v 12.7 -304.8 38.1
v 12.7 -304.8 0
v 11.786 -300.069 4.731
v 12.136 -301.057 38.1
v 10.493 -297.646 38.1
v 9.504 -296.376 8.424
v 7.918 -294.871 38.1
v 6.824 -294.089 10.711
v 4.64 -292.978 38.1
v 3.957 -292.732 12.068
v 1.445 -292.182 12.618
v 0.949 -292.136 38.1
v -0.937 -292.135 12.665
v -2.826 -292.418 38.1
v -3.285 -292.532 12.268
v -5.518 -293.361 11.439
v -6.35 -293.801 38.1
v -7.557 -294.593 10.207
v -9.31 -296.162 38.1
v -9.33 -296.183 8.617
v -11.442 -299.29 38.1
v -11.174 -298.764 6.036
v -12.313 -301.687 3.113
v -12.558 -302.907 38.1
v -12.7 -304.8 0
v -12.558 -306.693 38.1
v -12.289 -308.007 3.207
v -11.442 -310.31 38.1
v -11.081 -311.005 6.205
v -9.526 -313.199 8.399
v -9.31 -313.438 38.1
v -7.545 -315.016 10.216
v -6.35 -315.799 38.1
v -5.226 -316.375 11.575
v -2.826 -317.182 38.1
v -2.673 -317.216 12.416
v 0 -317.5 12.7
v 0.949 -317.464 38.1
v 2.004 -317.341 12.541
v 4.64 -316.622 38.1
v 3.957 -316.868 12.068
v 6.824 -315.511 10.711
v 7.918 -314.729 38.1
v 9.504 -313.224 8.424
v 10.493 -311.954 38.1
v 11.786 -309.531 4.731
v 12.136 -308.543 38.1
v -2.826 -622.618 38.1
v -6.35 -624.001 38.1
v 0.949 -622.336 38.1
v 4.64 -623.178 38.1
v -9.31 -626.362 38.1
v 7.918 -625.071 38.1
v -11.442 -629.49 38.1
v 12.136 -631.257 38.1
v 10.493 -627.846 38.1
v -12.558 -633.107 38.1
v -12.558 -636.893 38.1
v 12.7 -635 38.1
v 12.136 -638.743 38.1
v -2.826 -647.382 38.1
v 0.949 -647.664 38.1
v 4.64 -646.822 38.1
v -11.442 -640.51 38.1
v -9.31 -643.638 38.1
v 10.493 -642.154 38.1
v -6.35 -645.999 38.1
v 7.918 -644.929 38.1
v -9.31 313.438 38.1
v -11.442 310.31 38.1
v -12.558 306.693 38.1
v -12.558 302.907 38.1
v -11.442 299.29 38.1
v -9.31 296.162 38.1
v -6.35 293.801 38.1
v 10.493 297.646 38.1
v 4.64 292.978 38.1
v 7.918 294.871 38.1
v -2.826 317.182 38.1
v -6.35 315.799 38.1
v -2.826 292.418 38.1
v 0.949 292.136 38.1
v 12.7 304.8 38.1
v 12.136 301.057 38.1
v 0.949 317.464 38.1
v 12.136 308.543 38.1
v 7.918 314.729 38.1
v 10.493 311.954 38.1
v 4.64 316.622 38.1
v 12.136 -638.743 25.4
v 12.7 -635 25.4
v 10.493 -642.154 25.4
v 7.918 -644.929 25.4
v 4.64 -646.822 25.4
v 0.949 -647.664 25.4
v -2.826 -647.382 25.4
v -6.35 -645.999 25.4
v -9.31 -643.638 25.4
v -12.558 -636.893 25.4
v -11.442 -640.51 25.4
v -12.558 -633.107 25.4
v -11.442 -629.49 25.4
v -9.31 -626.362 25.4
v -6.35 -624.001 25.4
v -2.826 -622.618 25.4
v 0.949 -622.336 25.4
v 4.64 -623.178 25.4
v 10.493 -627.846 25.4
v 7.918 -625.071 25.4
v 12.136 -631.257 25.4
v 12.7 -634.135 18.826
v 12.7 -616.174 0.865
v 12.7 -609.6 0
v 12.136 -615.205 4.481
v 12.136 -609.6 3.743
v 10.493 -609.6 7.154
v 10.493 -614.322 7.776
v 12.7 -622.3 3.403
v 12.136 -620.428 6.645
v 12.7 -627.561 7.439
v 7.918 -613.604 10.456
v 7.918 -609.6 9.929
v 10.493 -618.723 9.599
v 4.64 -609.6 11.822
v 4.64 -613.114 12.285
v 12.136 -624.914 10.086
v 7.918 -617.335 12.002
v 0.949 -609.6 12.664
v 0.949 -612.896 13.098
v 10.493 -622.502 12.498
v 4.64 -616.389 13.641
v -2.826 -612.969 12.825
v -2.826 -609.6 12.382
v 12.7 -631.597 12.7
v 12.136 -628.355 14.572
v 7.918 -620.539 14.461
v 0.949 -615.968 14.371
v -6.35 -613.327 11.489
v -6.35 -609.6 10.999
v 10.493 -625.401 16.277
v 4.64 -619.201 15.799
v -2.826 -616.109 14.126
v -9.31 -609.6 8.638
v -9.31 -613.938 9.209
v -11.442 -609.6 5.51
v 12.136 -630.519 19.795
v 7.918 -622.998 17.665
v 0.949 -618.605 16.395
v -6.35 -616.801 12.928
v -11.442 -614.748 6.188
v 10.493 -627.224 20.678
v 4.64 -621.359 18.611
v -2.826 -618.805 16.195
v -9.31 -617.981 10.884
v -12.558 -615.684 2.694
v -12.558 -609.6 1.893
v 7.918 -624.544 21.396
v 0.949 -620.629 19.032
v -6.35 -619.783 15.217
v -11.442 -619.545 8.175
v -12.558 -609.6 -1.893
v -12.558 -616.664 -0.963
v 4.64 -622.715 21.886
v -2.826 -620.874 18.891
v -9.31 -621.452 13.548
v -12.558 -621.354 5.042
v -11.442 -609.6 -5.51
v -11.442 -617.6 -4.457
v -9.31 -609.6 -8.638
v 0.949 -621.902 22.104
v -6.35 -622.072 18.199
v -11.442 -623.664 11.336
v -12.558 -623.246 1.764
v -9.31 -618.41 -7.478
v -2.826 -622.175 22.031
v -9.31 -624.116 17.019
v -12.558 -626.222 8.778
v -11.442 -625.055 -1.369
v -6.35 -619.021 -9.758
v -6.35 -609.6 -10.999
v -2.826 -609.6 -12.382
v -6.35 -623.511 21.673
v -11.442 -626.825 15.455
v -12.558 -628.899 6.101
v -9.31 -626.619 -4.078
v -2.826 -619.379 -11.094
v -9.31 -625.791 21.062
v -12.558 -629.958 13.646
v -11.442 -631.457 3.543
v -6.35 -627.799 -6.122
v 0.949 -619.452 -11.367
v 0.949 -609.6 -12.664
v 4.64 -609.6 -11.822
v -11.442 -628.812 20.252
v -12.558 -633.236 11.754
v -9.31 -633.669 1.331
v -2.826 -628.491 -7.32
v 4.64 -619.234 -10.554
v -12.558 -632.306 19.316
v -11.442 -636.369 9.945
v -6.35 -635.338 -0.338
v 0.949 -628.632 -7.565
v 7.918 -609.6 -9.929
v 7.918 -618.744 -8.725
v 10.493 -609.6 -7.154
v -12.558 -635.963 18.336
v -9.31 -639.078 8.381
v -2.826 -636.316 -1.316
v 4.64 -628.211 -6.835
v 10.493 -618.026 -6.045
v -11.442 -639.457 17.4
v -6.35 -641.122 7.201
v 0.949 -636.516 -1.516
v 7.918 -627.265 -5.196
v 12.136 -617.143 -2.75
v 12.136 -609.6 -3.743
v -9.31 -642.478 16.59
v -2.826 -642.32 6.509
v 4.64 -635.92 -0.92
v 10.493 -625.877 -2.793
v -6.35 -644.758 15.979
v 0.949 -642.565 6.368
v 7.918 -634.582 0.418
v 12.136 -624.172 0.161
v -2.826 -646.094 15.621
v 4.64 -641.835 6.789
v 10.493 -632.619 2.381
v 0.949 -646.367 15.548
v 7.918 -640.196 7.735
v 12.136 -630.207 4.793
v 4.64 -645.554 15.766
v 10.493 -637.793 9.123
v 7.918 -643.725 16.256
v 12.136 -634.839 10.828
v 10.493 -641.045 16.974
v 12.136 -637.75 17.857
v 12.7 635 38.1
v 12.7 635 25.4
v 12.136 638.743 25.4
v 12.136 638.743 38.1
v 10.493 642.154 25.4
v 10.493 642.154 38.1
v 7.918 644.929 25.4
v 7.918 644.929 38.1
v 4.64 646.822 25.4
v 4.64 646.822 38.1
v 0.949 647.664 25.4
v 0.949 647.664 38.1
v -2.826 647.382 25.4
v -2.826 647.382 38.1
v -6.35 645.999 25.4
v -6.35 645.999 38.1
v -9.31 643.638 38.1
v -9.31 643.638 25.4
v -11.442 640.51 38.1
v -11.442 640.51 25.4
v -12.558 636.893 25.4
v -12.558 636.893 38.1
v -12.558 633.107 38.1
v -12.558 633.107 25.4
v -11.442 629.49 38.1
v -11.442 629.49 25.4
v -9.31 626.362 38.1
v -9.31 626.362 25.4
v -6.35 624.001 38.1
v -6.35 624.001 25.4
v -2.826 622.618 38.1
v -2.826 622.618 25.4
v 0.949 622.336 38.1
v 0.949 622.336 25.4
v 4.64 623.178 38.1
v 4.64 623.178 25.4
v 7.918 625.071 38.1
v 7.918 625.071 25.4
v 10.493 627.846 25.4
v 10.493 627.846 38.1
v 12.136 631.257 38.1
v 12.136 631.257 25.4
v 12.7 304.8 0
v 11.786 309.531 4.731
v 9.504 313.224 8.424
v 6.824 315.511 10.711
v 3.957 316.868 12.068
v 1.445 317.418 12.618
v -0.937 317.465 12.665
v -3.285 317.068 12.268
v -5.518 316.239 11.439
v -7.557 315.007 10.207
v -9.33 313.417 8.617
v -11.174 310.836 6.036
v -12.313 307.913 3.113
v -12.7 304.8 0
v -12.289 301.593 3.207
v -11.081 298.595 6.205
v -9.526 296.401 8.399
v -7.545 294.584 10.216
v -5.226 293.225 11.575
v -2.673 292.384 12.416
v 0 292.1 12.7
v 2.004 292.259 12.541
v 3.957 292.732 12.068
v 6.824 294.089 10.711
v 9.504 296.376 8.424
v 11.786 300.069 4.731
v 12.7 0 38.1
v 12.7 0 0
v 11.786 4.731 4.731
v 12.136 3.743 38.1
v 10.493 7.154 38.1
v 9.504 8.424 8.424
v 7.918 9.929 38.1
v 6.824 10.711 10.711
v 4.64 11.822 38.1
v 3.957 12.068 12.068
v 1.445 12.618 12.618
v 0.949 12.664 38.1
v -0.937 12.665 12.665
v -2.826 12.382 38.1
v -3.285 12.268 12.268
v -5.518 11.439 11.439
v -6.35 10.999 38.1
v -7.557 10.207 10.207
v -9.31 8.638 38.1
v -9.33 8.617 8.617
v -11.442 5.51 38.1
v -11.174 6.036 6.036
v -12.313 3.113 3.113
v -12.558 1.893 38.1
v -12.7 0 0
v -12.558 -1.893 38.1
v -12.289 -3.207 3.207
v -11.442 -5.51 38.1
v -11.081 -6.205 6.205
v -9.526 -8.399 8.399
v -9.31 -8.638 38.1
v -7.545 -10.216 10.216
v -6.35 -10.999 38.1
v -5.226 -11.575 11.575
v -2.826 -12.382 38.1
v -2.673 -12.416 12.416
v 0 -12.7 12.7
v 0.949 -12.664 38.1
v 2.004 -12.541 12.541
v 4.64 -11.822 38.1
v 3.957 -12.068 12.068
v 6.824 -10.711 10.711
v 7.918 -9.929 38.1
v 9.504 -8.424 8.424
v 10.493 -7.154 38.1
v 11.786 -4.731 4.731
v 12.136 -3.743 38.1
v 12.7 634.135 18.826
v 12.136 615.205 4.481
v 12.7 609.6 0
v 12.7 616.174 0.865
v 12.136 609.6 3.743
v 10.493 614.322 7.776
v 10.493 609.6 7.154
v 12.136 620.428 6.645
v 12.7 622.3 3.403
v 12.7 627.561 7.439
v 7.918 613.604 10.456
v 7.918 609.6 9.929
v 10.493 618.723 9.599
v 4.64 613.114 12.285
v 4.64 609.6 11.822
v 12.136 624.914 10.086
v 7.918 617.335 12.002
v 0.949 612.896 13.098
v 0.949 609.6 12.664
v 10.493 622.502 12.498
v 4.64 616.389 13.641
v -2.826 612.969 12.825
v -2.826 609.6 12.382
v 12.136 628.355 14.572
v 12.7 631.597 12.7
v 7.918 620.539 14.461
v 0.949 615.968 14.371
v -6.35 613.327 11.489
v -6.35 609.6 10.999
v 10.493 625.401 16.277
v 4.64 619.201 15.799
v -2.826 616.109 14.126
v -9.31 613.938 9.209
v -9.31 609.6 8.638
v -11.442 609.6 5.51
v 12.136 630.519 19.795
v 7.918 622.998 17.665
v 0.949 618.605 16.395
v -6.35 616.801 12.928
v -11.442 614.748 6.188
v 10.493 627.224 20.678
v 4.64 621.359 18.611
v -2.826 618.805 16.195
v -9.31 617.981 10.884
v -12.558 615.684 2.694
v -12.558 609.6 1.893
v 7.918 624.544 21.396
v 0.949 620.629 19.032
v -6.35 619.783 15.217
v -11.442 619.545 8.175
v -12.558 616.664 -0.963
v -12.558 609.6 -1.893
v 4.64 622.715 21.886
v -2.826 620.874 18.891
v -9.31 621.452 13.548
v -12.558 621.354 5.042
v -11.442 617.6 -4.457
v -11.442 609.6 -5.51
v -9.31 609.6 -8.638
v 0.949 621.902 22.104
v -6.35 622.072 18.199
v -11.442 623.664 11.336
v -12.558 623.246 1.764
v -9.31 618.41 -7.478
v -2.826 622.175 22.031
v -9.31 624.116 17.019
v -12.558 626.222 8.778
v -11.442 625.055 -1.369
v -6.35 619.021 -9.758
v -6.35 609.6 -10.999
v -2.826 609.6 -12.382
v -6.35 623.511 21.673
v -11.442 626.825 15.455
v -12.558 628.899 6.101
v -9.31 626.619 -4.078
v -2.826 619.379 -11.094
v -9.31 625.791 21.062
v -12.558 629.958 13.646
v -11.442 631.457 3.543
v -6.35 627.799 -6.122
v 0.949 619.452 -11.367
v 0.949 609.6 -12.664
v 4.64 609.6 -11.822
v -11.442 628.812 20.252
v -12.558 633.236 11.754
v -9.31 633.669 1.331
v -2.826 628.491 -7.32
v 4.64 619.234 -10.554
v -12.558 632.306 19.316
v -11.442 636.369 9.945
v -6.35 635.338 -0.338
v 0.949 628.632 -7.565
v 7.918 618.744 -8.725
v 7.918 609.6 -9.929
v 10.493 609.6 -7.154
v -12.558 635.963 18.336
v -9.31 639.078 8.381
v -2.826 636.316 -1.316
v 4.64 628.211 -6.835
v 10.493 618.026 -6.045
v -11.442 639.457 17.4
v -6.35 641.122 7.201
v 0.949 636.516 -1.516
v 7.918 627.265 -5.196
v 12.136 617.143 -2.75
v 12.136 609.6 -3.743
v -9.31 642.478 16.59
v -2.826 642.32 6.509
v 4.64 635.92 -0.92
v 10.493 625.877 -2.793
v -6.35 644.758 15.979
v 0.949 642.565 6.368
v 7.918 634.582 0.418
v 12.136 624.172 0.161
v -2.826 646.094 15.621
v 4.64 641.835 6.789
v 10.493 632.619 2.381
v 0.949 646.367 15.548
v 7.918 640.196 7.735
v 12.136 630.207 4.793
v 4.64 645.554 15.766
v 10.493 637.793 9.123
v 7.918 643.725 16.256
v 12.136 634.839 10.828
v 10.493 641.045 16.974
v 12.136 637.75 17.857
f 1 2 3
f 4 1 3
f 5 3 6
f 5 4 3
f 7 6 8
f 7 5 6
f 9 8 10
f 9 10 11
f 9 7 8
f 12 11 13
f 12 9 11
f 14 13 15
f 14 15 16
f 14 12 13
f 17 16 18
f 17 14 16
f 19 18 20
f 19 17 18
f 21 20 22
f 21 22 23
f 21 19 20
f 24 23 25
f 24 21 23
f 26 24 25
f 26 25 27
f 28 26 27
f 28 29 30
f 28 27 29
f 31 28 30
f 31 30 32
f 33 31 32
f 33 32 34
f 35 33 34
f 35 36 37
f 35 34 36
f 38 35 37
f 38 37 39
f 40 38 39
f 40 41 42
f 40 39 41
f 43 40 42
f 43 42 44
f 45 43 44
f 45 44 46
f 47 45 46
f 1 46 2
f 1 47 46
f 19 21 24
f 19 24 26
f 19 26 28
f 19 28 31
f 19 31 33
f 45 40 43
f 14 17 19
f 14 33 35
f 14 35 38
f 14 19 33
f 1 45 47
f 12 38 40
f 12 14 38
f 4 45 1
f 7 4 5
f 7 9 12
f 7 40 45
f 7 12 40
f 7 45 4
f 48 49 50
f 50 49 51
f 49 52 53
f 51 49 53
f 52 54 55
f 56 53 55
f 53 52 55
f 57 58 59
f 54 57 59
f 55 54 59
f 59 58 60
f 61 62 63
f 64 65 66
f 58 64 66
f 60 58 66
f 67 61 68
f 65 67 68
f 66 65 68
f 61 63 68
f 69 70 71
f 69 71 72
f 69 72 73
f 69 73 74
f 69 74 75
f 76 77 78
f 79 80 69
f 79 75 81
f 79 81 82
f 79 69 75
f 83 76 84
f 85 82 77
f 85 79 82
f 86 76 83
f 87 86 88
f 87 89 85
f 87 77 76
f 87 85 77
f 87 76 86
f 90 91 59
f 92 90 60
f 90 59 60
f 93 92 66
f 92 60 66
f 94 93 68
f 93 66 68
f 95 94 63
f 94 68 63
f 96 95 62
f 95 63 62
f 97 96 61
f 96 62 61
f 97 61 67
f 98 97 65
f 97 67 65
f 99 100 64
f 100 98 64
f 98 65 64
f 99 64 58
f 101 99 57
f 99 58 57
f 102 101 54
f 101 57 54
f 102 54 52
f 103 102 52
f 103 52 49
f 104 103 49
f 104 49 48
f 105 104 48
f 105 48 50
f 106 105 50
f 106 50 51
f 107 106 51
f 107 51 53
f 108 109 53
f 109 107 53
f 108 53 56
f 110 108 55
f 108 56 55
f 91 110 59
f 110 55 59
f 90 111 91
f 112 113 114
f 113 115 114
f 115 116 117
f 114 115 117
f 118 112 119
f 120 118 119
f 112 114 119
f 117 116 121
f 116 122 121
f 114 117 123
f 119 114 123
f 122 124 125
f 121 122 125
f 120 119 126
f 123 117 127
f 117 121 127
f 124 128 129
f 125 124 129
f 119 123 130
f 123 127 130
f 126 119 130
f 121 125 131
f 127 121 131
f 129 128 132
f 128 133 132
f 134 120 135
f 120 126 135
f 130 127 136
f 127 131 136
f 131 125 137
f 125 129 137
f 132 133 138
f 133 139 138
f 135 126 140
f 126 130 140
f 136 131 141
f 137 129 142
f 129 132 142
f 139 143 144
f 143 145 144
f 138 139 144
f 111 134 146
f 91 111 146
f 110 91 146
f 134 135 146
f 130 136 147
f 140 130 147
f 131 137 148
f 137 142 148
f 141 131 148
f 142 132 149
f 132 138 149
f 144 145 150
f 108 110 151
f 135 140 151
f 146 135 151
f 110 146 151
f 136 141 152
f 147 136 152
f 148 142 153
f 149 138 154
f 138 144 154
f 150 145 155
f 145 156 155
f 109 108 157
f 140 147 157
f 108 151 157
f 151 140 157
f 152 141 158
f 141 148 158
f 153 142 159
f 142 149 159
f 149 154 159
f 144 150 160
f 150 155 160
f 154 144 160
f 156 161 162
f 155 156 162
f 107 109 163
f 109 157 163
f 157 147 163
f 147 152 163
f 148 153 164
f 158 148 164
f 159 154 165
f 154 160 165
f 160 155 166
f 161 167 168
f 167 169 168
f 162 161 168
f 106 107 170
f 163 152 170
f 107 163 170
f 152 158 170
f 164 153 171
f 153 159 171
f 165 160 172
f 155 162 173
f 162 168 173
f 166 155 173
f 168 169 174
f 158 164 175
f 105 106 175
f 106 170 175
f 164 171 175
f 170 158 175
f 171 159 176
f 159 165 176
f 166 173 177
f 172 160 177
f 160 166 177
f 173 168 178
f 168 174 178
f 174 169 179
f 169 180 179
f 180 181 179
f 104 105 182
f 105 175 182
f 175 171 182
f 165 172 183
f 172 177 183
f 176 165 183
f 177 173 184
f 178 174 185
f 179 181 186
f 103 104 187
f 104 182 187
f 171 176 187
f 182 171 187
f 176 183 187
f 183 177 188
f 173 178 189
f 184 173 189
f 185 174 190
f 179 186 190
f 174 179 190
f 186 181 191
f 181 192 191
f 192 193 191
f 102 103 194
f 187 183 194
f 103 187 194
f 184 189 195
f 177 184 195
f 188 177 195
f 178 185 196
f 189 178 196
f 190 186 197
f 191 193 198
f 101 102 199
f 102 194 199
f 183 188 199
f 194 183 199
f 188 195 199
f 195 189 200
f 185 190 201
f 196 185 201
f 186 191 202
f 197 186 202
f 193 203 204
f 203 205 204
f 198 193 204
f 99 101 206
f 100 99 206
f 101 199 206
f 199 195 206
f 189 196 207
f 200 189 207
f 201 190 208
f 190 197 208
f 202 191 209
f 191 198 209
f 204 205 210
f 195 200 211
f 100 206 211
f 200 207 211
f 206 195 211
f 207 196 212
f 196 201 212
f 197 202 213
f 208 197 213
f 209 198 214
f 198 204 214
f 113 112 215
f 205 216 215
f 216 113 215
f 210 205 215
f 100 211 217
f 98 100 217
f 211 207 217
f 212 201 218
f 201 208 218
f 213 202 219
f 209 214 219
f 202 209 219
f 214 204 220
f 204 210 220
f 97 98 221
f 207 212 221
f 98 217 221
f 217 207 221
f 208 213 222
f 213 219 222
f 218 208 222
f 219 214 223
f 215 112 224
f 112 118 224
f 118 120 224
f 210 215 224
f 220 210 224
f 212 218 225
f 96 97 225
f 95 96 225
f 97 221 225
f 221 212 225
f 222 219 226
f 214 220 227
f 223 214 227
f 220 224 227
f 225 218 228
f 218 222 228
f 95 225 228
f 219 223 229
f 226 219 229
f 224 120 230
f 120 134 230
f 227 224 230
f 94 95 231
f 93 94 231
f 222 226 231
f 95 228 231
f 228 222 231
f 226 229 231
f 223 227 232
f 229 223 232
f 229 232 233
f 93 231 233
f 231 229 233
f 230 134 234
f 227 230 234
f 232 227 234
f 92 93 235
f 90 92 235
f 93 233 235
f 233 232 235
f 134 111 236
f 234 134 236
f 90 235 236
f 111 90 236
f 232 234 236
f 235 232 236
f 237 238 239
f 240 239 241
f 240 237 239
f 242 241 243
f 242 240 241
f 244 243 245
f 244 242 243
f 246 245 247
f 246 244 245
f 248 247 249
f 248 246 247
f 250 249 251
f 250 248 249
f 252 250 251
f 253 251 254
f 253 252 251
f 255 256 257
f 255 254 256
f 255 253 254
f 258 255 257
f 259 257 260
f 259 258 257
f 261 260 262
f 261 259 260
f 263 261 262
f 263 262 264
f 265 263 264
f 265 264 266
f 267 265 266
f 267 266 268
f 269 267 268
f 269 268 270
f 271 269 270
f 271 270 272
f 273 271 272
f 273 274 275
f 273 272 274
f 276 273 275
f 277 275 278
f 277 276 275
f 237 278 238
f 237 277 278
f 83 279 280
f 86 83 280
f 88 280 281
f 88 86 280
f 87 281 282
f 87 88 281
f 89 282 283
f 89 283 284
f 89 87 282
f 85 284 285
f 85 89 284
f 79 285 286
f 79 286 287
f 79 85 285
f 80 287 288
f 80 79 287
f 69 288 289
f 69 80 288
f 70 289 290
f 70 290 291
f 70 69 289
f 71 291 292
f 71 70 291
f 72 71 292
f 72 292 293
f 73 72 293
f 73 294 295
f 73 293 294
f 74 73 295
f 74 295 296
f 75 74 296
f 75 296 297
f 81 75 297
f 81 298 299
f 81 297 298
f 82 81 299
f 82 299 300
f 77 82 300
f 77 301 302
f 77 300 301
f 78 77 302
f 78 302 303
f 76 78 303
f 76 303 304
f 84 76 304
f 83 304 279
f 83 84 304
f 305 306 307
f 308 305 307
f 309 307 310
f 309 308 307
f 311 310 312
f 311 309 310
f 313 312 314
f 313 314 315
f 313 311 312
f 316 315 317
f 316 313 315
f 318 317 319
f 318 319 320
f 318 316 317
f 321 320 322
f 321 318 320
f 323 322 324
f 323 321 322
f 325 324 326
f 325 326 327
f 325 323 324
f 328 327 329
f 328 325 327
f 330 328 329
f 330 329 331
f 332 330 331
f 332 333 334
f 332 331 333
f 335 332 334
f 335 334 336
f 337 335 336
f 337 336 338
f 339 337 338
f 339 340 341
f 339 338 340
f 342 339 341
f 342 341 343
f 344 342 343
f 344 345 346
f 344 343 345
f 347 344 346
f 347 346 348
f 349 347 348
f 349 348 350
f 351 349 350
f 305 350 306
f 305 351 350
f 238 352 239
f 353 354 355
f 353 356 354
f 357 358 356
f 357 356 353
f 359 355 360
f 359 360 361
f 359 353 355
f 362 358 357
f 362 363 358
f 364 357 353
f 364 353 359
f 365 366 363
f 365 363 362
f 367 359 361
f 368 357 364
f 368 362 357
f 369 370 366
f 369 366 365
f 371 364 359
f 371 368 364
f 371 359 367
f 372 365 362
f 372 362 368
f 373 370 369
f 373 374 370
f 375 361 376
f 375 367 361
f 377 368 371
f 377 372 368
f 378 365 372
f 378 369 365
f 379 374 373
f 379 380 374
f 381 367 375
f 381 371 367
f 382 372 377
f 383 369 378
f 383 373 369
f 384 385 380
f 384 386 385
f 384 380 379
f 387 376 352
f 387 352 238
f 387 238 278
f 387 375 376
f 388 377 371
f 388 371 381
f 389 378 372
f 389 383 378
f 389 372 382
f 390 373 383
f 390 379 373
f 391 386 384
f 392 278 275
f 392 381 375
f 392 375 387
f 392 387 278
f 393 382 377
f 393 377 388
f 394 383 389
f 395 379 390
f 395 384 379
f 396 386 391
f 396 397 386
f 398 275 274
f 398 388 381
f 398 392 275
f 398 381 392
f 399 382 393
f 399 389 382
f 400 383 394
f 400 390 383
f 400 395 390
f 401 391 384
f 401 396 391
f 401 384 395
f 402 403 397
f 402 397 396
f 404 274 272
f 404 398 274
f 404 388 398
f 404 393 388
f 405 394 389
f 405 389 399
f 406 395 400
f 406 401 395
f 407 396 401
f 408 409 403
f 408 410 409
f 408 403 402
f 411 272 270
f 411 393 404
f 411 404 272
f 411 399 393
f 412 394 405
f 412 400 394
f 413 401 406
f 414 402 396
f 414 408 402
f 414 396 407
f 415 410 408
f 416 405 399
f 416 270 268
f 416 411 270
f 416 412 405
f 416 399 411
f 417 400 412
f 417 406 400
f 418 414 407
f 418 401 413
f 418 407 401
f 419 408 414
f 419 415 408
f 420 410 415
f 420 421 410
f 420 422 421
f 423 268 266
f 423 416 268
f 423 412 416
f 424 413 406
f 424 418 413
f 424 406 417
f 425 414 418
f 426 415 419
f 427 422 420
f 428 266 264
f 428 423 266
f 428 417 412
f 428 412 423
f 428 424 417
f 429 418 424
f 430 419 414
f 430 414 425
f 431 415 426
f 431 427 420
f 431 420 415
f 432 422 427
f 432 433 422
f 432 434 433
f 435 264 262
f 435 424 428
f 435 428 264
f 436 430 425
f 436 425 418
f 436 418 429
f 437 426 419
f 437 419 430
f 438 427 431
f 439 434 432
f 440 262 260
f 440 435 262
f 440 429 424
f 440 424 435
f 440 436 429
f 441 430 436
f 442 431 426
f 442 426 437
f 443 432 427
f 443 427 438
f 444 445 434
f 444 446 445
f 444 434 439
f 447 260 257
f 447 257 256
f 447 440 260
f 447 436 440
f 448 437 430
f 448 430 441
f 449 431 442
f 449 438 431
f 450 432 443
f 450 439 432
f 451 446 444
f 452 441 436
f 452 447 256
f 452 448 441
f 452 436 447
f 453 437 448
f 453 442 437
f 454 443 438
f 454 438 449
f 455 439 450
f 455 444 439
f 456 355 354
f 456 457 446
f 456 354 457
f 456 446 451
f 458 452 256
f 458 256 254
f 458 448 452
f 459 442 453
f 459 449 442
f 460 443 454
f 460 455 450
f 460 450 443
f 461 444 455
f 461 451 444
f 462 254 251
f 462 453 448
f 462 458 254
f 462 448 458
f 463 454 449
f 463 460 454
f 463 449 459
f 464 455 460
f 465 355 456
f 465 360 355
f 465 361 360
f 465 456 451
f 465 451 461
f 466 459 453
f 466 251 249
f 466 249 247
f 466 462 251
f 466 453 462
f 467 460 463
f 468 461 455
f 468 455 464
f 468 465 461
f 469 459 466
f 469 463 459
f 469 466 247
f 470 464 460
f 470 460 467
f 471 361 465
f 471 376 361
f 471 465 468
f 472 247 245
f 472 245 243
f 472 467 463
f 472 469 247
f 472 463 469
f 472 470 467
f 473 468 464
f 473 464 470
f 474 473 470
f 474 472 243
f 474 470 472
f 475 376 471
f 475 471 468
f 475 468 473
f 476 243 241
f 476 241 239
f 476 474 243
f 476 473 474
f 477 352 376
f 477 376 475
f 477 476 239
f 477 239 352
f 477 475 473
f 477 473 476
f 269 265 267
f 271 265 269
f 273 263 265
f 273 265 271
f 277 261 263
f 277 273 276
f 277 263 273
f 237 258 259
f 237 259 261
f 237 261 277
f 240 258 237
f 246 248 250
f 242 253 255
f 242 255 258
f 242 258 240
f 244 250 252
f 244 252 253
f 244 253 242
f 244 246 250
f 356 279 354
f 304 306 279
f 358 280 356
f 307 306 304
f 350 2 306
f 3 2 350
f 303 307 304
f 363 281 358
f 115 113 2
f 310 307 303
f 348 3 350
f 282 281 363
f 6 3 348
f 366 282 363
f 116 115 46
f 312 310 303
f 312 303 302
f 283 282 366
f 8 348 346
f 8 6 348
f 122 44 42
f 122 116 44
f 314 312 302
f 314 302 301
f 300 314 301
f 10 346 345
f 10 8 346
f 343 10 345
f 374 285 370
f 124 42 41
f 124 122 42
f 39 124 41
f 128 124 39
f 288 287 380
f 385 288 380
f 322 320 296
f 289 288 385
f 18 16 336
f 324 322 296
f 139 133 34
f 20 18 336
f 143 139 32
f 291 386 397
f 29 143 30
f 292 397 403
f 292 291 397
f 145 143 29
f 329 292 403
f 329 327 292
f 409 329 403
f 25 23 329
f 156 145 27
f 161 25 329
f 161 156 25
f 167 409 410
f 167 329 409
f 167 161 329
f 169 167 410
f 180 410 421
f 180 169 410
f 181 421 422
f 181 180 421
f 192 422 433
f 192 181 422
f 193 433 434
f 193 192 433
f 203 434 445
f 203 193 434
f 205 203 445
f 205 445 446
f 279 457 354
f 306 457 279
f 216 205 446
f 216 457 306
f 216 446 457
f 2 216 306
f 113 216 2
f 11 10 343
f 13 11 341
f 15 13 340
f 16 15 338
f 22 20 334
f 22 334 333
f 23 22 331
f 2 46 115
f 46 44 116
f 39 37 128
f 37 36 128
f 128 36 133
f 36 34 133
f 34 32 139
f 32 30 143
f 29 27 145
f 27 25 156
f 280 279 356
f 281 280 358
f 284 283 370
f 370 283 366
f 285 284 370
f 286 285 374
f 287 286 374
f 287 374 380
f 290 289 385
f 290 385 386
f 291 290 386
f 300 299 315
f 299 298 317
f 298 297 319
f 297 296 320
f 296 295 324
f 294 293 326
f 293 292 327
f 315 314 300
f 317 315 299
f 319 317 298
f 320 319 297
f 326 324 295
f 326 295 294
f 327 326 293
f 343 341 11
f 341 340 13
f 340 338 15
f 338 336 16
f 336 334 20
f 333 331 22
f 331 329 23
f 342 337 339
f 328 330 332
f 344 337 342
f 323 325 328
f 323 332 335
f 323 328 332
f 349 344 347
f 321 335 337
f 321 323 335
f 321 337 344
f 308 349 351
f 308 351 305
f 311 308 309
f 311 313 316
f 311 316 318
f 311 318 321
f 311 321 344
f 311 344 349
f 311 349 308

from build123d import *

# Parameters (mm, degrees)
F0_R          = 12.7
F1_DEPTH      = 609.6
F1_DEPTH_BACK = 609.6
F3_R          = 12.7
F8_R          = 12.7


# Not quite as in the source:
# - a pattern or mirror of a feature is missing from the dataset's text; its kind, count and spacing are read off the source's solid


with BuildPart() as f1:
    # F0 (on Front) → F1 (new body, two sides)
    with BuildSketch(Plane.XZ) as f1_sk:
        Circle(F0_R)
    extrude(amount=F1_DEPTH)
    extrude(f1_sk.sketch, amount=-F1_DEPTH_BACK)

    # F5: sweep along a path in F4
    with BuildLine(Plane.YZ) as f5_path:
        ThreePointArc((609.6, 0), (627.5605122421, 7.4394877579), (635, 25.4))
        Line((635, 25.4), (635, 38.1))
    # F3 (on offset) → F5 (sweep)
    with BuildSketch(Plane.XY.offset(38.1)):
        with Locations((0, 635)):
            Circle(F3_R)
    f5 = sweep(path=f5_path.line)

    # F5_copies: F5 across plane
    add(f5.mirror(Plane(origin=(0, 0, 0), x_dir=(0, 0, -1), z_dir=(0, -1, 0))))

    # F8 (on offset) → F9 (join, up to the next surface of F1)
    with BuildSketch(Plane.XY.offset(38.1)):
        with Locations((0, 304.8)):
            Circle(F8_R)
        with Locations((0, -304.8)):
            Circle(F8_R)
        Circle(F8_R)
    extrude(until=Until.NEXT, dir=(0, 0, -1))


solid = f1.part
